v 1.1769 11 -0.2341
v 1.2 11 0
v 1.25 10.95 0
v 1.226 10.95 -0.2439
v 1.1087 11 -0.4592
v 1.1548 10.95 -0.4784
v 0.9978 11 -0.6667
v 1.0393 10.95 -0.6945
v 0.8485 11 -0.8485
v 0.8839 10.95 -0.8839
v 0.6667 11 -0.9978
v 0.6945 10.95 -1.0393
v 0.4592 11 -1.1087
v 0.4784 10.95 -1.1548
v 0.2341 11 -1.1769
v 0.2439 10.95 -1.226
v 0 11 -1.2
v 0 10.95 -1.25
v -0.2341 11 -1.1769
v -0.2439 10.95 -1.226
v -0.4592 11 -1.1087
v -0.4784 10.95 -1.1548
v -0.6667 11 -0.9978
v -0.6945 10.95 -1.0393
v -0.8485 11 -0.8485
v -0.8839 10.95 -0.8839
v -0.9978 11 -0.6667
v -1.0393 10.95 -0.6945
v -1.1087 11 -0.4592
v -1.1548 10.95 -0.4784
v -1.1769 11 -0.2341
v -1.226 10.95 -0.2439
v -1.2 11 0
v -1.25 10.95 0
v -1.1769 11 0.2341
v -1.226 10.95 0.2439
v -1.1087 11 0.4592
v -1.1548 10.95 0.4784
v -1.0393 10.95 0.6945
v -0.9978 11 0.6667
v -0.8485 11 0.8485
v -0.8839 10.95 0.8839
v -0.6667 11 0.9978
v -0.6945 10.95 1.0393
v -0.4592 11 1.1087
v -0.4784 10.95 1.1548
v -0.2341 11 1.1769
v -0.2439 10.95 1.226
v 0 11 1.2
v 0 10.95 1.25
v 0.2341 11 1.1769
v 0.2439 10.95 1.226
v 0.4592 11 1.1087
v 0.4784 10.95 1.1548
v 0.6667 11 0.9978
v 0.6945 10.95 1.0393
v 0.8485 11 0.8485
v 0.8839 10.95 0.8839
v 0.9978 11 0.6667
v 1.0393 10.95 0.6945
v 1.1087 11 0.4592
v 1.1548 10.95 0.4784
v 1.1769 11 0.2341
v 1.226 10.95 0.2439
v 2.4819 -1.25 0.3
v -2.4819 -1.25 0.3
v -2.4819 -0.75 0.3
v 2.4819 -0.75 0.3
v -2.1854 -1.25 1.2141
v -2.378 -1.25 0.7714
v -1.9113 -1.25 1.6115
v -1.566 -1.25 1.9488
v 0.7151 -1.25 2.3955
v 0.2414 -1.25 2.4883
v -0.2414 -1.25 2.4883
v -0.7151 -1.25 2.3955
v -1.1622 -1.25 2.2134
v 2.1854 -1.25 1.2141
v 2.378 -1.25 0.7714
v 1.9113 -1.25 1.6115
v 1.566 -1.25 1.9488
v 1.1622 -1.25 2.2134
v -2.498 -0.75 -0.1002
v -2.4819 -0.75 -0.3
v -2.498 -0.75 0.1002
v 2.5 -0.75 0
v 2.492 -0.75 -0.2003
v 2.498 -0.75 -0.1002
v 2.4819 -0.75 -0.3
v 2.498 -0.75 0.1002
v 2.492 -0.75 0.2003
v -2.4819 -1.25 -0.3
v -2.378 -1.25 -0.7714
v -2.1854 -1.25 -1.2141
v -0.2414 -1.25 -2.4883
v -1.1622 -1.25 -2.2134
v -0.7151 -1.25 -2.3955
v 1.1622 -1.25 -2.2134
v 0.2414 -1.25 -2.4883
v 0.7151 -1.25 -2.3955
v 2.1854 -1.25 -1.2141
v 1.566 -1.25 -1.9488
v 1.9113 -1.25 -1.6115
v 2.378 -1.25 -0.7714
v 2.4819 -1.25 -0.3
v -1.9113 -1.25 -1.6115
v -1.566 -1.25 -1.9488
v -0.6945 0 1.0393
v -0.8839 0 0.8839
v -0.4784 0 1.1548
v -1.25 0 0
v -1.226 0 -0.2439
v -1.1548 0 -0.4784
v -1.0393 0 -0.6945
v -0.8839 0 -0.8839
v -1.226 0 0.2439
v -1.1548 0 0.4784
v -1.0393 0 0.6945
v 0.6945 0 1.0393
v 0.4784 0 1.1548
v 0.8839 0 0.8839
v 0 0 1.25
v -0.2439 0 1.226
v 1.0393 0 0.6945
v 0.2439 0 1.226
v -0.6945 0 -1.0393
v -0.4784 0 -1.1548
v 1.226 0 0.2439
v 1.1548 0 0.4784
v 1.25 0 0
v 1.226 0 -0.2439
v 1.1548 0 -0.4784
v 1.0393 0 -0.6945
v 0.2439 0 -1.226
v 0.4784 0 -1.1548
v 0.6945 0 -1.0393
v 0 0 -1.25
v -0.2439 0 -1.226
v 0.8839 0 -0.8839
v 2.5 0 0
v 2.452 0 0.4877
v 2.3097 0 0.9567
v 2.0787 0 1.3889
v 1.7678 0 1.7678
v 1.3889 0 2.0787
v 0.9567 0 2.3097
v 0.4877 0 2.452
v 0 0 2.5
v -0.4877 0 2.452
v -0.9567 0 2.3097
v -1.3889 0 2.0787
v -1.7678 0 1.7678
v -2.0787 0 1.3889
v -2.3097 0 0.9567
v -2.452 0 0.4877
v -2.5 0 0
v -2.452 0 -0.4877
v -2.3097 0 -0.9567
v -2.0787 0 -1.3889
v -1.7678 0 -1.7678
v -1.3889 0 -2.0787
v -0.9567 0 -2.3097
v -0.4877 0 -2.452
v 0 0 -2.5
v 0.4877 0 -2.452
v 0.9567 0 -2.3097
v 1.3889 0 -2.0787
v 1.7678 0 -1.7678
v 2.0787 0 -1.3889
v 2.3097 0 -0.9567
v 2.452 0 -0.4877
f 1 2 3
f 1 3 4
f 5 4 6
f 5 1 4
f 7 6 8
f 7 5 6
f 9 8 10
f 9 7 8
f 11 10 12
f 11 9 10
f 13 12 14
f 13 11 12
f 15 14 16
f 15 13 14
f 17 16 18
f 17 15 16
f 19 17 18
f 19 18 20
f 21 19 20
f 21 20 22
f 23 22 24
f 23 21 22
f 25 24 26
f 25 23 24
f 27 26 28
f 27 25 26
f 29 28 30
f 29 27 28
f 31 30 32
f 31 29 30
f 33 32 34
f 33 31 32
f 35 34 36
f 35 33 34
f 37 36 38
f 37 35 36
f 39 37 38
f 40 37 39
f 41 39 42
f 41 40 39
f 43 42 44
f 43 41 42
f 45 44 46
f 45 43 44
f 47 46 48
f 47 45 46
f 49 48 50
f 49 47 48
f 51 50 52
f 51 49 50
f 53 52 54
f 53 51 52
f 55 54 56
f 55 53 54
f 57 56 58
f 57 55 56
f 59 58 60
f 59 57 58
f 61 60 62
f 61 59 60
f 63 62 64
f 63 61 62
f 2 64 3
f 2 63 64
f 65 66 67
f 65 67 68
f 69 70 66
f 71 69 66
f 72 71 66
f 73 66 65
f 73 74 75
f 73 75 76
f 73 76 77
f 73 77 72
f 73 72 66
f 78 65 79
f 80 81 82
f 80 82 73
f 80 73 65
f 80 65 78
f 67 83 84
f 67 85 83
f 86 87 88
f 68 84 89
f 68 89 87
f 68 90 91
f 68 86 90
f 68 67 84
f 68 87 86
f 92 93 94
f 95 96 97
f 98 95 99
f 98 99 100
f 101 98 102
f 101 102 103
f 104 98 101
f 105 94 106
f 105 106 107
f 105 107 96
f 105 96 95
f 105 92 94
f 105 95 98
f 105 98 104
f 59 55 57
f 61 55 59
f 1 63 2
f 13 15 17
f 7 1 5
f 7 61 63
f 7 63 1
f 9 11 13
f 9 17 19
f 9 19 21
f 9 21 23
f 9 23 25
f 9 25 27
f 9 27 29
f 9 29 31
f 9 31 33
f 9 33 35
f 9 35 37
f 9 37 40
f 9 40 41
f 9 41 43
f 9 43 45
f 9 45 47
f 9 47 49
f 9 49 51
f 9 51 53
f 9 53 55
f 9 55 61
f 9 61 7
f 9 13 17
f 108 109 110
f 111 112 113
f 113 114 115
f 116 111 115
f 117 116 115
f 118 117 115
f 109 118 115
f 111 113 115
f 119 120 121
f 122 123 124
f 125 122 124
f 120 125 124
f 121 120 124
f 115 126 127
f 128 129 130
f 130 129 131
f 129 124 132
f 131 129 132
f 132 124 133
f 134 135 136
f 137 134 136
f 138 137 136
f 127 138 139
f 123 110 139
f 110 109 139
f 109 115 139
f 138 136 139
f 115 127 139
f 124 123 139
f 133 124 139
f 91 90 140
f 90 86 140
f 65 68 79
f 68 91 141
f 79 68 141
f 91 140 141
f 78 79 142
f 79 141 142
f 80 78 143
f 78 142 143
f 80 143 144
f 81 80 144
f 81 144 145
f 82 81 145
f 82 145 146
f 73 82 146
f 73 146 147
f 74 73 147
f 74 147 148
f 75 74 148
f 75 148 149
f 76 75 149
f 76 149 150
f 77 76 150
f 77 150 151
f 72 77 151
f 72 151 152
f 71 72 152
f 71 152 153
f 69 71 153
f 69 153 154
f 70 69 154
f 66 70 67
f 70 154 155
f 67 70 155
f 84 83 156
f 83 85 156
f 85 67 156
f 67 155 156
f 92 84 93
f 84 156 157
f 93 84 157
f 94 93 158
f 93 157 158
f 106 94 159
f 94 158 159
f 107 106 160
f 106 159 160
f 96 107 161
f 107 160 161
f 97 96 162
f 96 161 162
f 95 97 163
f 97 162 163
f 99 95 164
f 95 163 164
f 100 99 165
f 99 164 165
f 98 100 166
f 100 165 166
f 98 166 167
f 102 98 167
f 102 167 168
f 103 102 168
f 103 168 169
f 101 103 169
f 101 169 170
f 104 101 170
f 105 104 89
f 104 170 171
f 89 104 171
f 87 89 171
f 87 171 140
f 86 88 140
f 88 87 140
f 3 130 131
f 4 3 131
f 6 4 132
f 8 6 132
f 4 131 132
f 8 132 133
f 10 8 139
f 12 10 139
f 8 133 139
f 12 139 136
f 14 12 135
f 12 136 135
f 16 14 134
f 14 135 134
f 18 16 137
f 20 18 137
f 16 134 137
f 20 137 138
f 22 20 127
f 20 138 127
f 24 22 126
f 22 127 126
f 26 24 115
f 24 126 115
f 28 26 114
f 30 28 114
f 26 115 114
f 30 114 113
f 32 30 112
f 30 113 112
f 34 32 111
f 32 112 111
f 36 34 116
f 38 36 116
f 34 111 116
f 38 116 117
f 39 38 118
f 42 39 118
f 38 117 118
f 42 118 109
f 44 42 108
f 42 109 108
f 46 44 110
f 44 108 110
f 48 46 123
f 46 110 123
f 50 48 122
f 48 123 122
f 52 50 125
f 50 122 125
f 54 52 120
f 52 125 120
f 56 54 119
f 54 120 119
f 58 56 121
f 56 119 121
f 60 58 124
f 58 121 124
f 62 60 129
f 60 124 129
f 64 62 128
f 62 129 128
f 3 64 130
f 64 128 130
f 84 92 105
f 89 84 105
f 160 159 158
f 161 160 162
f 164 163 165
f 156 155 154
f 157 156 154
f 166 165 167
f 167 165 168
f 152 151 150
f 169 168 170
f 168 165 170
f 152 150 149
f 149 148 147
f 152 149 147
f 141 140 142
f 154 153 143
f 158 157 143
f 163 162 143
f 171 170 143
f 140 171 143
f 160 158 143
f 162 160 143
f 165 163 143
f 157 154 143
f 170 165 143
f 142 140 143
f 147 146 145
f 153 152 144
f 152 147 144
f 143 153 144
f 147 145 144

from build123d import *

# Parameters (mm, degrees)
SKETCH1_R           = 1.25
BOSS_EXTRUDE1_DEPTH = 11
SKETCH2_R           = 2.5
BOSS_EXTRUDE2_DEPTH = 1.25
SKETCH3_W           = 8.196351728
SKETCH3_H           = 0.6
CUT_EXTRUDE1_DEPTH  = 0.5
CHAMFER1_SIZE       = 0.05


with BuildPart() as part:
    # Sketch1 → Boss-Extrude1 (new body)
    with BuildSketch(Plane(origin=(0, 0, 0), x_dir=(1, 0, 0), z_dir=(0, 1, 0))):
        Circle(SKETCH1_R)
    extrude(amount=BOSS_EXTRUDE1_DEPTH)

    # Chamfer1
    chamfer1_edges = [part.edges().sort_by_distance(p)[0] for p in [
        (-1.25, 11, 0),
    ]]
    chamfer(chamfer1_edges, length=CHAMFER1_SIZE)


with BuildPart() as body_2:
    # Sketch2 → Boss-Extrude2 (new body)
    with BuildSketch(Plane.XZ):
        Circle(SKETCH2_R)
    extrude(amount=BOSS_EXTRUDE2_DEPTH)

    # Sketch3 → Cut-Extrude1 (cut)
    with BuildSketch(Plane.XZ.offset(1.25)):
        Rectangle(SKETCH3_W, SKETCH3_H)
    extrude(amount=-CUT_EXTRUDE1_DEPTH, mode=Mode.SUBTRACT)


solid = Compound([part.part, body_2.part])
